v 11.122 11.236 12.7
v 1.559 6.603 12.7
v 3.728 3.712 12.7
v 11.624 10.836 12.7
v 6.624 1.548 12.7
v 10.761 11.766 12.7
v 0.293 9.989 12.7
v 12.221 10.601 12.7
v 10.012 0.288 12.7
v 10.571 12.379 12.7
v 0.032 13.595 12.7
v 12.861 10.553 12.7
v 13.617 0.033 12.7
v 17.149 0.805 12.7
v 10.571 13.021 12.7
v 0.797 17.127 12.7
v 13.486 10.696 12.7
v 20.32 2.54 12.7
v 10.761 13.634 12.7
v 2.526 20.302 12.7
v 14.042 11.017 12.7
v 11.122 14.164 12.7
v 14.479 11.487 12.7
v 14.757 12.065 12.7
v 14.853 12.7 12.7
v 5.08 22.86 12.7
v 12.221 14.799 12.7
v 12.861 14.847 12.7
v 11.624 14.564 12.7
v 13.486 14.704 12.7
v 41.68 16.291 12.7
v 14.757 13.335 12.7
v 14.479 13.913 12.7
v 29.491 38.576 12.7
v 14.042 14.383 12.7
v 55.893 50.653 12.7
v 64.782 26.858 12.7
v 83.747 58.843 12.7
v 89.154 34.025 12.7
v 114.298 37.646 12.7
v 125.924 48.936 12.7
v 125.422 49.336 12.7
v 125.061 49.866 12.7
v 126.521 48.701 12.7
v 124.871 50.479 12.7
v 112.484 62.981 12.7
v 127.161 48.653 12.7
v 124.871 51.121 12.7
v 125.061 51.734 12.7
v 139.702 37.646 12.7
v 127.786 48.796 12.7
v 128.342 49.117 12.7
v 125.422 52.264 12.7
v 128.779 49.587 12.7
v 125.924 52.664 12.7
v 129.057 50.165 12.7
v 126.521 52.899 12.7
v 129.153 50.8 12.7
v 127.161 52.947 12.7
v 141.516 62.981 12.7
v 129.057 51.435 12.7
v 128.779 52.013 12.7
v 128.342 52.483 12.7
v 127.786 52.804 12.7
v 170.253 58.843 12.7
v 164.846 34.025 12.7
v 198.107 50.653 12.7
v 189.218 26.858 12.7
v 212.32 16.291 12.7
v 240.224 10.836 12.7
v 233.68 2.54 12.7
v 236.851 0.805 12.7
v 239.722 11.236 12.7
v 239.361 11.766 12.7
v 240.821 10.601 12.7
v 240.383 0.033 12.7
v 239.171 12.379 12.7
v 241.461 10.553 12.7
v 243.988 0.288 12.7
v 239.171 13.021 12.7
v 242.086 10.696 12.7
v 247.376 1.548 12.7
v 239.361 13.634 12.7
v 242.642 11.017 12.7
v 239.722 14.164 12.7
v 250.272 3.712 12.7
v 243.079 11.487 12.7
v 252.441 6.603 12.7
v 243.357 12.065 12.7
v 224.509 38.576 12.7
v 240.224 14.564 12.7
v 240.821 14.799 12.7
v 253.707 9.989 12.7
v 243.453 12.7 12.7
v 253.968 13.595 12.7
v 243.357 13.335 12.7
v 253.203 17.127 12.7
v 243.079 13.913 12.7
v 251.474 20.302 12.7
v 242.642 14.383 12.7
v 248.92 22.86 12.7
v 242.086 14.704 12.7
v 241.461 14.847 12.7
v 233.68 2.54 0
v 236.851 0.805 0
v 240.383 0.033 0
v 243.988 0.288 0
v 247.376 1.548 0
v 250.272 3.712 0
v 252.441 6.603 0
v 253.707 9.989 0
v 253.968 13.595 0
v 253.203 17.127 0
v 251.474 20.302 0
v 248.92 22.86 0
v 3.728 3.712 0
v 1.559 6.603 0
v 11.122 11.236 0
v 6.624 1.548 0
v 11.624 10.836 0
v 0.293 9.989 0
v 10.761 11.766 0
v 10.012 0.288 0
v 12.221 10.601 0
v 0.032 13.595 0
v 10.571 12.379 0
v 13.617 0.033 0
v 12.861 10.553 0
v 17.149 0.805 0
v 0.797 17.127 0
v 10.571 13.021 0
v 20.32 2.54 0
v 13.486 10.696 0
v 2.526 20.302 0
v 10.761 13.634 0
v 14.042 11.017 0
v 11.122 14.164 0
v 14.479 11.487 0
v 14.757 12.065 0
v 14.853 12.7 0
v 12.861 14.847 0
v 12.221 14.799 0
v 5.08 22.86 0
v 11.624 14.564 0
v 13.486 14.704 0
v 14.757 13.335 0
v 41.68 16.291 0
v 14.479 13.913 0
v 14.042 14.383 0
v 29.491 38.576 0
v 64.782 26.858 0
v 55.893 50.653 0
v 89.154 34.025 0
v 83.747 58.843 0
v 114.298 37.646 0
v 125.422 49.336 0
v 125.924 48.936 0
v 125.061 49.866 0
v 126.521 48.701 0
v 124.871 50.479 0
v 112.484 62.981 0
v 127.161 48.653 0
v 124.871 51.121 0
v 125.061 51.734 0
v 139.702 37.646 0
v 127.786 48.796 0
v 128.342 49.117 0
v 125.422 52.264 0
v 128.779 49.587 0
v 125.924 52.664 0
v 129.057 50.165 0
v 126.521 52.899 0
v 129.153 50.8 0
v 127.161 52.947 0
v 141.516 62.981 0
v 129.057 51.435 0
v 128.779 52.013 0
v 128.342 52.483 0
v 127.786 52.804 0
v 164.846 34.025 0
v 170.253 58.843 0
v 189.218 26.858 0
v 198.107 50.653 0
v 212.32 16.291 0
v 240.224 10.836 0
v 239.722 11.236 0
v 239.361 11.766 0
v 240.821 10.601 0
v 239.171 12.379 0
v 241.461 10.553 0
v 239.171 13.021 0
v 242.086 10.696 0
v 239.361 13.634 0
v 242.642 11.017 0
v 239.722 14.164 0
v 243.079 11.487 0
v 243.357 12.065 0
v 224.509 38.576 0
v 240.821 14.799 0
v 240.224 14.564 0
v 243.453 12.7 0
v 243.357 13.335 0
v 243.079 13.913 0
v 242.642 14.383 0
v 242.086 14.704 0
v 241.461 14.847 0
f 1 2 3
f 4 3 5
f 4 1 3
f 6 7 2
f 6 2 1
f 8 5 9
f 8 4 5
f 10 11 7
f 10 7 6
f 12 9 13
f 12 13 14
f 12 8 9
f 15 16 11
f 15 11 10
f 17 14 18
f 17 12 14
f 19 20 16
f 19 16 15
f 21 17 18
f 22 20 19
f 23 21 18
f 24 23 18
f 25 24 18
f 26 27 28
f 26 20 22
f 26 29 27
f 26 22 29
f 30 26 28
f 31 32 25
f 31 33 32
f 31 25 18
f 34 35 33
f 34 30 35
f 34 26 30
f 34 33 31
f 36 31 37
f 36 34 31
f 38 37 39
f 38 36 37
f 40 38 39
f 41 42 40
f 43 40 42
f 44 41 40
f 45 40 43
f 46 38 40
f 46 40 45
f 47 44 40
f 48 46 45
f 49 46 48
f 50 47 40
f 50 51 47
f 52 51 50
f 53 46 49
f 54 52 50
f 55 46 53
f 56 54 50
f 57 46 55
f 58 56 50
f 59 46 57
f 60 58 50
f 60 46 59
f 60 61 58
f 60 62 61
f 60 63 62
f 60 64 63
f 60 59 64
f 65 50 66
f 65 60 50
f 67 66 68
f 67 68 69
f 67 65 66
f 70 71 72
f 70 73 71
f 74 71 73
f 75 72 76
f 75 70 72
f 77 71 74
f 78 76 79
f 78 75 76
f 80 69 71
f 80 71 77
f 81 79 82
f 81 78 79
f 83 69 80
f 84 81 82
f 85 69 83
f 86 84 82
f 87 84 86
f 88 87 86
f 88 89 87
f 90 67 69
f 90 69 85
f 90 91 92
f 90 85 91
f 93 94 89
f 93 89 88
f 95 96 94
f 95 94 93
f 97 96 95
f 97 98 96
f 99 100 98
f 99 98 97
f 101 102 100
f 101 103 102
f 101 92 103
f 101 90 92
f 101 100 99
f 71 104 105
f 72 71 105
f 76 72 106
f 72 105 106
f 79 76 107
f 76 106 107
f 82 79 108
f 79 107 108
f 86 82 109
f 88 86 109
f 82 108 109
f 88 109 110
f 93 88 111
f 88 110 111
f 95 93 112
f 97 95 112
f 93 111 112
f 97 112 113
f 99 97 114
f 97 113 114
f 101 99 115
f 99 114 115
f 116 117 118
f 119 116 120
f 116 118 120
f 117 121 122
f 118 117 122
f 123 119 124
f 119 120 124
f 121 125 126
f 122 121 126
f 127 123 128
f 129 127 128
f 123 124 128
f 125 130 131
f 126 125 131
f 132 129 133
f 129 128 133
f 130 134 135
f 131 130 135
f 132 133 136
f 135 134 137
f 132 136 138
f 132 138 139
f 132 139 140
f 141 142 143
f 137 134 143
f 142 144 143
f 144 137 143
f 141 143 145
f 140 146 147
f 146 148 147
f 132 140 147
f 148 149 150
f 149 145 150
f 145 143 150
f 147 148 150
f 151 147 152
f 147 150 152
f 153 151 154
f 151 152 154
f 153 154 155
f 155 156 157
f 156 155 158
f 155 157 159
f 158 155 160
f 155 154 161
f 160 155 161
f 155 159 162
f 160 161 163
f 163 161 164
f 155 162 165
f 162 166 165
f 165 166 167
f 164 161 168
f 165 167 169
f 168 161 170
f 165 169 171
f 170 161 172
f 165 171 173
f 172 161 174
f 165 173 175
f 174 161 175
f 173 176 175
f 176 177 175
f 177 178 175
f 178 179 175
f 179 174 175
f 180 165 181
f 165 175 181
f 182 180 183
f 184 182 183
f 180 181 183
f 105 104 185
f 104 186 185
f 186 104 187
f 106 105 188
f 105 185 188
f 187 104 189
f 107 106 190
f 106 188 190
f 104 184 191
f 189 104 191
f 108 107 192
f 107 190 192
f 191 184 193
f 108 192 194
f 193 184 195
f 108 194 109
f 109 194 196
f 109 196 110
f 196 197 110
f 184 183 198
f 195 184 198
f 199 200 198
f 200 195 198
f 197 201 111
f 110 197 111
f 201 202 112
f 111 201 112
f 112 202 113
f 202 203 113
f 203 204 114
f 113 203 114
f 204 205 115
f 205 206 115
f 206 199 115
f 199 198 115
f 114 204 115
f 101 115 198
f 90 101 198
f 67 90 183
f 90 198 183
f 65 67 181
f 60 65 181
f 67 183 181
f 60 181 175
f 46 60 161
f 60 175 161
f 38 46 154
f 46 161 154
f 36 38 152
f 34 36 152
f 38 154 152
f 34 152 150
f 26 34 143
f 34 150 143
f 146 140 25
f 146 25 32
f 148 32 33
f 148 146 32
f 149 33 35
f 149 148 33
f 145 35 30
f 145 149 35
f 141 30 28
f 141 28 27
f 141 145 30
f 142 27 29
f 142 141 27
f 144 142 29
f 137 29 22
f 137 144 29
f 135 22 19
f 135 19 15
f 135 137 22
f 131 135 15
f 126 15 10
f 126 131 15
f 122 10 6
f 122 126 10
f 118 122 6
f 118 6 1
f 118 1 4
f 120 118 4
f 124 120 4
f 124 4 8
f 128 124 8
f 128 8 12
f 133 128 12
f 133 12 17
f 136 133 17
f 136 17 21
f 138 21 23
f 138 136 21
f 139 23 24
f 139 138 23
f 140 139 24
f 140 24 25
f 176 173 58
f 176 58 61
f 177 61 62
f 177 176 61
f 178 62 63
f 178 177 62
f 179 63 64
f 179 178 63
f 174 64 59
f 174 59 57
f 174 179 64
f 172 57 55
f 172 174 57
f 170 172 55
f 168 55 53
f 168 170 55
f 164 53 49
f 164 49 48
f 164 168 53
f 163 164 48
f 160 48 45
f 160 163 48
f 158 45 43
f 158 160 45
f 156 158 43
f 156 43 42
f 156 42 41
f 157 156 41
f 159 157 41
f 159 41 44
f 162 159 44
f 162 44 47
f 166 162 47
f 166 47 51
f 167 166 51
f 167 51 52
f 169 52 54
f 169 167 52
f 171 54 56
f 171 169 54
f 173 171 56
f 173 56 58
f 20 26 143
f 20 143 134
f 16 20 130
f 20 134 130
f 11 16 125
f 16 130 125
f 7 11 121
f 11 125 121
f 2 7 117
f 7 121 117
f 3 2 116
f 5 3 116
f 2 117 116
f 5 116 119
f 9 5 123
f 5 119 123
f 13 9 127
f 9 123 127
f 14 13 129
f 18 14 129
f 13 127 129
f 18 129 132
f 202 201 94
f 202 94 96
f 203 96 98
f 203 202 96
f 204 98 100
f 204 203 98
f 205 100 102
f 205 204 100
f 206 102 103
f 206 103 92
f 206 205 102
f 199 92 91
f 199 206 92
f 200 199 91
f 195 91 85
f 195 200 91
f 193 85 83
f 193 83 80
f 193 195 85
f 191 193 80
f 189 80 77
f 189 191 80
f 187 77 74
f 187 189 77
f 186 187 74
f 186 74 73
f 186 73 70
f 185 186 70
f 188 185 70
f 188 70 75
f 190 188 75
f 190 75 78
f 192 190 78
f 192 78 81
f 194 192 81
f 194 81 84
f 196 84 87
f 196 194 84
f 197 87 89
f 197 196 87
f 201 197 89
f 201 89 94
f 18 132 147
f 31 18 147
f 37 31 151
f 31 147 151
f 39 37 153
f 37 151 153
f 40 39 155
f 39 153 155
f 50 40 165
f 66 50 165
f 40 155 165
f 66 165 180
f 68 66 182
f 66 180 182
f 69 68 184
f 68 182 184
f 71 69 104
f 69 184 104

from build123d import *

# Parameters (mm, degrees)
F0_R     = 2.15265
F1_DEPTH = 12.7


with BuildPart() as f1:
    # F0 (on Top) → F1 (new body)
    with BuildSketch(Plane.XY):
        with BuildLine():
            ThreePointArc((248.92, 22.86), (127, 63.5), (5.08, 22.86))
            ThreePointArc((5.08, 22.86), (2.54, 5.08), (20.32, 2.54))
            ThreePointArc((20.32, 2.54), (127, 38.1), (233.68, 2.54))
            ThreePointArc((233.68, 2.54), (251.46, 5.08), (248.92, 22.86))
        make_face()
        with Locations((12.7, 12.7)):
            Circle(F0_R, mode=Mode.SUBTRACT)
        with Locations((241.3, 12.7)):
            Circle(F0_R, mode=Mode.SUBTRACT)
        with Locations((127, 50.8)):
            Circle(F0_R, mode=Mode.SUBTRACT)
    extrude(amount=F1_DEPTH)


solid = f1.part
